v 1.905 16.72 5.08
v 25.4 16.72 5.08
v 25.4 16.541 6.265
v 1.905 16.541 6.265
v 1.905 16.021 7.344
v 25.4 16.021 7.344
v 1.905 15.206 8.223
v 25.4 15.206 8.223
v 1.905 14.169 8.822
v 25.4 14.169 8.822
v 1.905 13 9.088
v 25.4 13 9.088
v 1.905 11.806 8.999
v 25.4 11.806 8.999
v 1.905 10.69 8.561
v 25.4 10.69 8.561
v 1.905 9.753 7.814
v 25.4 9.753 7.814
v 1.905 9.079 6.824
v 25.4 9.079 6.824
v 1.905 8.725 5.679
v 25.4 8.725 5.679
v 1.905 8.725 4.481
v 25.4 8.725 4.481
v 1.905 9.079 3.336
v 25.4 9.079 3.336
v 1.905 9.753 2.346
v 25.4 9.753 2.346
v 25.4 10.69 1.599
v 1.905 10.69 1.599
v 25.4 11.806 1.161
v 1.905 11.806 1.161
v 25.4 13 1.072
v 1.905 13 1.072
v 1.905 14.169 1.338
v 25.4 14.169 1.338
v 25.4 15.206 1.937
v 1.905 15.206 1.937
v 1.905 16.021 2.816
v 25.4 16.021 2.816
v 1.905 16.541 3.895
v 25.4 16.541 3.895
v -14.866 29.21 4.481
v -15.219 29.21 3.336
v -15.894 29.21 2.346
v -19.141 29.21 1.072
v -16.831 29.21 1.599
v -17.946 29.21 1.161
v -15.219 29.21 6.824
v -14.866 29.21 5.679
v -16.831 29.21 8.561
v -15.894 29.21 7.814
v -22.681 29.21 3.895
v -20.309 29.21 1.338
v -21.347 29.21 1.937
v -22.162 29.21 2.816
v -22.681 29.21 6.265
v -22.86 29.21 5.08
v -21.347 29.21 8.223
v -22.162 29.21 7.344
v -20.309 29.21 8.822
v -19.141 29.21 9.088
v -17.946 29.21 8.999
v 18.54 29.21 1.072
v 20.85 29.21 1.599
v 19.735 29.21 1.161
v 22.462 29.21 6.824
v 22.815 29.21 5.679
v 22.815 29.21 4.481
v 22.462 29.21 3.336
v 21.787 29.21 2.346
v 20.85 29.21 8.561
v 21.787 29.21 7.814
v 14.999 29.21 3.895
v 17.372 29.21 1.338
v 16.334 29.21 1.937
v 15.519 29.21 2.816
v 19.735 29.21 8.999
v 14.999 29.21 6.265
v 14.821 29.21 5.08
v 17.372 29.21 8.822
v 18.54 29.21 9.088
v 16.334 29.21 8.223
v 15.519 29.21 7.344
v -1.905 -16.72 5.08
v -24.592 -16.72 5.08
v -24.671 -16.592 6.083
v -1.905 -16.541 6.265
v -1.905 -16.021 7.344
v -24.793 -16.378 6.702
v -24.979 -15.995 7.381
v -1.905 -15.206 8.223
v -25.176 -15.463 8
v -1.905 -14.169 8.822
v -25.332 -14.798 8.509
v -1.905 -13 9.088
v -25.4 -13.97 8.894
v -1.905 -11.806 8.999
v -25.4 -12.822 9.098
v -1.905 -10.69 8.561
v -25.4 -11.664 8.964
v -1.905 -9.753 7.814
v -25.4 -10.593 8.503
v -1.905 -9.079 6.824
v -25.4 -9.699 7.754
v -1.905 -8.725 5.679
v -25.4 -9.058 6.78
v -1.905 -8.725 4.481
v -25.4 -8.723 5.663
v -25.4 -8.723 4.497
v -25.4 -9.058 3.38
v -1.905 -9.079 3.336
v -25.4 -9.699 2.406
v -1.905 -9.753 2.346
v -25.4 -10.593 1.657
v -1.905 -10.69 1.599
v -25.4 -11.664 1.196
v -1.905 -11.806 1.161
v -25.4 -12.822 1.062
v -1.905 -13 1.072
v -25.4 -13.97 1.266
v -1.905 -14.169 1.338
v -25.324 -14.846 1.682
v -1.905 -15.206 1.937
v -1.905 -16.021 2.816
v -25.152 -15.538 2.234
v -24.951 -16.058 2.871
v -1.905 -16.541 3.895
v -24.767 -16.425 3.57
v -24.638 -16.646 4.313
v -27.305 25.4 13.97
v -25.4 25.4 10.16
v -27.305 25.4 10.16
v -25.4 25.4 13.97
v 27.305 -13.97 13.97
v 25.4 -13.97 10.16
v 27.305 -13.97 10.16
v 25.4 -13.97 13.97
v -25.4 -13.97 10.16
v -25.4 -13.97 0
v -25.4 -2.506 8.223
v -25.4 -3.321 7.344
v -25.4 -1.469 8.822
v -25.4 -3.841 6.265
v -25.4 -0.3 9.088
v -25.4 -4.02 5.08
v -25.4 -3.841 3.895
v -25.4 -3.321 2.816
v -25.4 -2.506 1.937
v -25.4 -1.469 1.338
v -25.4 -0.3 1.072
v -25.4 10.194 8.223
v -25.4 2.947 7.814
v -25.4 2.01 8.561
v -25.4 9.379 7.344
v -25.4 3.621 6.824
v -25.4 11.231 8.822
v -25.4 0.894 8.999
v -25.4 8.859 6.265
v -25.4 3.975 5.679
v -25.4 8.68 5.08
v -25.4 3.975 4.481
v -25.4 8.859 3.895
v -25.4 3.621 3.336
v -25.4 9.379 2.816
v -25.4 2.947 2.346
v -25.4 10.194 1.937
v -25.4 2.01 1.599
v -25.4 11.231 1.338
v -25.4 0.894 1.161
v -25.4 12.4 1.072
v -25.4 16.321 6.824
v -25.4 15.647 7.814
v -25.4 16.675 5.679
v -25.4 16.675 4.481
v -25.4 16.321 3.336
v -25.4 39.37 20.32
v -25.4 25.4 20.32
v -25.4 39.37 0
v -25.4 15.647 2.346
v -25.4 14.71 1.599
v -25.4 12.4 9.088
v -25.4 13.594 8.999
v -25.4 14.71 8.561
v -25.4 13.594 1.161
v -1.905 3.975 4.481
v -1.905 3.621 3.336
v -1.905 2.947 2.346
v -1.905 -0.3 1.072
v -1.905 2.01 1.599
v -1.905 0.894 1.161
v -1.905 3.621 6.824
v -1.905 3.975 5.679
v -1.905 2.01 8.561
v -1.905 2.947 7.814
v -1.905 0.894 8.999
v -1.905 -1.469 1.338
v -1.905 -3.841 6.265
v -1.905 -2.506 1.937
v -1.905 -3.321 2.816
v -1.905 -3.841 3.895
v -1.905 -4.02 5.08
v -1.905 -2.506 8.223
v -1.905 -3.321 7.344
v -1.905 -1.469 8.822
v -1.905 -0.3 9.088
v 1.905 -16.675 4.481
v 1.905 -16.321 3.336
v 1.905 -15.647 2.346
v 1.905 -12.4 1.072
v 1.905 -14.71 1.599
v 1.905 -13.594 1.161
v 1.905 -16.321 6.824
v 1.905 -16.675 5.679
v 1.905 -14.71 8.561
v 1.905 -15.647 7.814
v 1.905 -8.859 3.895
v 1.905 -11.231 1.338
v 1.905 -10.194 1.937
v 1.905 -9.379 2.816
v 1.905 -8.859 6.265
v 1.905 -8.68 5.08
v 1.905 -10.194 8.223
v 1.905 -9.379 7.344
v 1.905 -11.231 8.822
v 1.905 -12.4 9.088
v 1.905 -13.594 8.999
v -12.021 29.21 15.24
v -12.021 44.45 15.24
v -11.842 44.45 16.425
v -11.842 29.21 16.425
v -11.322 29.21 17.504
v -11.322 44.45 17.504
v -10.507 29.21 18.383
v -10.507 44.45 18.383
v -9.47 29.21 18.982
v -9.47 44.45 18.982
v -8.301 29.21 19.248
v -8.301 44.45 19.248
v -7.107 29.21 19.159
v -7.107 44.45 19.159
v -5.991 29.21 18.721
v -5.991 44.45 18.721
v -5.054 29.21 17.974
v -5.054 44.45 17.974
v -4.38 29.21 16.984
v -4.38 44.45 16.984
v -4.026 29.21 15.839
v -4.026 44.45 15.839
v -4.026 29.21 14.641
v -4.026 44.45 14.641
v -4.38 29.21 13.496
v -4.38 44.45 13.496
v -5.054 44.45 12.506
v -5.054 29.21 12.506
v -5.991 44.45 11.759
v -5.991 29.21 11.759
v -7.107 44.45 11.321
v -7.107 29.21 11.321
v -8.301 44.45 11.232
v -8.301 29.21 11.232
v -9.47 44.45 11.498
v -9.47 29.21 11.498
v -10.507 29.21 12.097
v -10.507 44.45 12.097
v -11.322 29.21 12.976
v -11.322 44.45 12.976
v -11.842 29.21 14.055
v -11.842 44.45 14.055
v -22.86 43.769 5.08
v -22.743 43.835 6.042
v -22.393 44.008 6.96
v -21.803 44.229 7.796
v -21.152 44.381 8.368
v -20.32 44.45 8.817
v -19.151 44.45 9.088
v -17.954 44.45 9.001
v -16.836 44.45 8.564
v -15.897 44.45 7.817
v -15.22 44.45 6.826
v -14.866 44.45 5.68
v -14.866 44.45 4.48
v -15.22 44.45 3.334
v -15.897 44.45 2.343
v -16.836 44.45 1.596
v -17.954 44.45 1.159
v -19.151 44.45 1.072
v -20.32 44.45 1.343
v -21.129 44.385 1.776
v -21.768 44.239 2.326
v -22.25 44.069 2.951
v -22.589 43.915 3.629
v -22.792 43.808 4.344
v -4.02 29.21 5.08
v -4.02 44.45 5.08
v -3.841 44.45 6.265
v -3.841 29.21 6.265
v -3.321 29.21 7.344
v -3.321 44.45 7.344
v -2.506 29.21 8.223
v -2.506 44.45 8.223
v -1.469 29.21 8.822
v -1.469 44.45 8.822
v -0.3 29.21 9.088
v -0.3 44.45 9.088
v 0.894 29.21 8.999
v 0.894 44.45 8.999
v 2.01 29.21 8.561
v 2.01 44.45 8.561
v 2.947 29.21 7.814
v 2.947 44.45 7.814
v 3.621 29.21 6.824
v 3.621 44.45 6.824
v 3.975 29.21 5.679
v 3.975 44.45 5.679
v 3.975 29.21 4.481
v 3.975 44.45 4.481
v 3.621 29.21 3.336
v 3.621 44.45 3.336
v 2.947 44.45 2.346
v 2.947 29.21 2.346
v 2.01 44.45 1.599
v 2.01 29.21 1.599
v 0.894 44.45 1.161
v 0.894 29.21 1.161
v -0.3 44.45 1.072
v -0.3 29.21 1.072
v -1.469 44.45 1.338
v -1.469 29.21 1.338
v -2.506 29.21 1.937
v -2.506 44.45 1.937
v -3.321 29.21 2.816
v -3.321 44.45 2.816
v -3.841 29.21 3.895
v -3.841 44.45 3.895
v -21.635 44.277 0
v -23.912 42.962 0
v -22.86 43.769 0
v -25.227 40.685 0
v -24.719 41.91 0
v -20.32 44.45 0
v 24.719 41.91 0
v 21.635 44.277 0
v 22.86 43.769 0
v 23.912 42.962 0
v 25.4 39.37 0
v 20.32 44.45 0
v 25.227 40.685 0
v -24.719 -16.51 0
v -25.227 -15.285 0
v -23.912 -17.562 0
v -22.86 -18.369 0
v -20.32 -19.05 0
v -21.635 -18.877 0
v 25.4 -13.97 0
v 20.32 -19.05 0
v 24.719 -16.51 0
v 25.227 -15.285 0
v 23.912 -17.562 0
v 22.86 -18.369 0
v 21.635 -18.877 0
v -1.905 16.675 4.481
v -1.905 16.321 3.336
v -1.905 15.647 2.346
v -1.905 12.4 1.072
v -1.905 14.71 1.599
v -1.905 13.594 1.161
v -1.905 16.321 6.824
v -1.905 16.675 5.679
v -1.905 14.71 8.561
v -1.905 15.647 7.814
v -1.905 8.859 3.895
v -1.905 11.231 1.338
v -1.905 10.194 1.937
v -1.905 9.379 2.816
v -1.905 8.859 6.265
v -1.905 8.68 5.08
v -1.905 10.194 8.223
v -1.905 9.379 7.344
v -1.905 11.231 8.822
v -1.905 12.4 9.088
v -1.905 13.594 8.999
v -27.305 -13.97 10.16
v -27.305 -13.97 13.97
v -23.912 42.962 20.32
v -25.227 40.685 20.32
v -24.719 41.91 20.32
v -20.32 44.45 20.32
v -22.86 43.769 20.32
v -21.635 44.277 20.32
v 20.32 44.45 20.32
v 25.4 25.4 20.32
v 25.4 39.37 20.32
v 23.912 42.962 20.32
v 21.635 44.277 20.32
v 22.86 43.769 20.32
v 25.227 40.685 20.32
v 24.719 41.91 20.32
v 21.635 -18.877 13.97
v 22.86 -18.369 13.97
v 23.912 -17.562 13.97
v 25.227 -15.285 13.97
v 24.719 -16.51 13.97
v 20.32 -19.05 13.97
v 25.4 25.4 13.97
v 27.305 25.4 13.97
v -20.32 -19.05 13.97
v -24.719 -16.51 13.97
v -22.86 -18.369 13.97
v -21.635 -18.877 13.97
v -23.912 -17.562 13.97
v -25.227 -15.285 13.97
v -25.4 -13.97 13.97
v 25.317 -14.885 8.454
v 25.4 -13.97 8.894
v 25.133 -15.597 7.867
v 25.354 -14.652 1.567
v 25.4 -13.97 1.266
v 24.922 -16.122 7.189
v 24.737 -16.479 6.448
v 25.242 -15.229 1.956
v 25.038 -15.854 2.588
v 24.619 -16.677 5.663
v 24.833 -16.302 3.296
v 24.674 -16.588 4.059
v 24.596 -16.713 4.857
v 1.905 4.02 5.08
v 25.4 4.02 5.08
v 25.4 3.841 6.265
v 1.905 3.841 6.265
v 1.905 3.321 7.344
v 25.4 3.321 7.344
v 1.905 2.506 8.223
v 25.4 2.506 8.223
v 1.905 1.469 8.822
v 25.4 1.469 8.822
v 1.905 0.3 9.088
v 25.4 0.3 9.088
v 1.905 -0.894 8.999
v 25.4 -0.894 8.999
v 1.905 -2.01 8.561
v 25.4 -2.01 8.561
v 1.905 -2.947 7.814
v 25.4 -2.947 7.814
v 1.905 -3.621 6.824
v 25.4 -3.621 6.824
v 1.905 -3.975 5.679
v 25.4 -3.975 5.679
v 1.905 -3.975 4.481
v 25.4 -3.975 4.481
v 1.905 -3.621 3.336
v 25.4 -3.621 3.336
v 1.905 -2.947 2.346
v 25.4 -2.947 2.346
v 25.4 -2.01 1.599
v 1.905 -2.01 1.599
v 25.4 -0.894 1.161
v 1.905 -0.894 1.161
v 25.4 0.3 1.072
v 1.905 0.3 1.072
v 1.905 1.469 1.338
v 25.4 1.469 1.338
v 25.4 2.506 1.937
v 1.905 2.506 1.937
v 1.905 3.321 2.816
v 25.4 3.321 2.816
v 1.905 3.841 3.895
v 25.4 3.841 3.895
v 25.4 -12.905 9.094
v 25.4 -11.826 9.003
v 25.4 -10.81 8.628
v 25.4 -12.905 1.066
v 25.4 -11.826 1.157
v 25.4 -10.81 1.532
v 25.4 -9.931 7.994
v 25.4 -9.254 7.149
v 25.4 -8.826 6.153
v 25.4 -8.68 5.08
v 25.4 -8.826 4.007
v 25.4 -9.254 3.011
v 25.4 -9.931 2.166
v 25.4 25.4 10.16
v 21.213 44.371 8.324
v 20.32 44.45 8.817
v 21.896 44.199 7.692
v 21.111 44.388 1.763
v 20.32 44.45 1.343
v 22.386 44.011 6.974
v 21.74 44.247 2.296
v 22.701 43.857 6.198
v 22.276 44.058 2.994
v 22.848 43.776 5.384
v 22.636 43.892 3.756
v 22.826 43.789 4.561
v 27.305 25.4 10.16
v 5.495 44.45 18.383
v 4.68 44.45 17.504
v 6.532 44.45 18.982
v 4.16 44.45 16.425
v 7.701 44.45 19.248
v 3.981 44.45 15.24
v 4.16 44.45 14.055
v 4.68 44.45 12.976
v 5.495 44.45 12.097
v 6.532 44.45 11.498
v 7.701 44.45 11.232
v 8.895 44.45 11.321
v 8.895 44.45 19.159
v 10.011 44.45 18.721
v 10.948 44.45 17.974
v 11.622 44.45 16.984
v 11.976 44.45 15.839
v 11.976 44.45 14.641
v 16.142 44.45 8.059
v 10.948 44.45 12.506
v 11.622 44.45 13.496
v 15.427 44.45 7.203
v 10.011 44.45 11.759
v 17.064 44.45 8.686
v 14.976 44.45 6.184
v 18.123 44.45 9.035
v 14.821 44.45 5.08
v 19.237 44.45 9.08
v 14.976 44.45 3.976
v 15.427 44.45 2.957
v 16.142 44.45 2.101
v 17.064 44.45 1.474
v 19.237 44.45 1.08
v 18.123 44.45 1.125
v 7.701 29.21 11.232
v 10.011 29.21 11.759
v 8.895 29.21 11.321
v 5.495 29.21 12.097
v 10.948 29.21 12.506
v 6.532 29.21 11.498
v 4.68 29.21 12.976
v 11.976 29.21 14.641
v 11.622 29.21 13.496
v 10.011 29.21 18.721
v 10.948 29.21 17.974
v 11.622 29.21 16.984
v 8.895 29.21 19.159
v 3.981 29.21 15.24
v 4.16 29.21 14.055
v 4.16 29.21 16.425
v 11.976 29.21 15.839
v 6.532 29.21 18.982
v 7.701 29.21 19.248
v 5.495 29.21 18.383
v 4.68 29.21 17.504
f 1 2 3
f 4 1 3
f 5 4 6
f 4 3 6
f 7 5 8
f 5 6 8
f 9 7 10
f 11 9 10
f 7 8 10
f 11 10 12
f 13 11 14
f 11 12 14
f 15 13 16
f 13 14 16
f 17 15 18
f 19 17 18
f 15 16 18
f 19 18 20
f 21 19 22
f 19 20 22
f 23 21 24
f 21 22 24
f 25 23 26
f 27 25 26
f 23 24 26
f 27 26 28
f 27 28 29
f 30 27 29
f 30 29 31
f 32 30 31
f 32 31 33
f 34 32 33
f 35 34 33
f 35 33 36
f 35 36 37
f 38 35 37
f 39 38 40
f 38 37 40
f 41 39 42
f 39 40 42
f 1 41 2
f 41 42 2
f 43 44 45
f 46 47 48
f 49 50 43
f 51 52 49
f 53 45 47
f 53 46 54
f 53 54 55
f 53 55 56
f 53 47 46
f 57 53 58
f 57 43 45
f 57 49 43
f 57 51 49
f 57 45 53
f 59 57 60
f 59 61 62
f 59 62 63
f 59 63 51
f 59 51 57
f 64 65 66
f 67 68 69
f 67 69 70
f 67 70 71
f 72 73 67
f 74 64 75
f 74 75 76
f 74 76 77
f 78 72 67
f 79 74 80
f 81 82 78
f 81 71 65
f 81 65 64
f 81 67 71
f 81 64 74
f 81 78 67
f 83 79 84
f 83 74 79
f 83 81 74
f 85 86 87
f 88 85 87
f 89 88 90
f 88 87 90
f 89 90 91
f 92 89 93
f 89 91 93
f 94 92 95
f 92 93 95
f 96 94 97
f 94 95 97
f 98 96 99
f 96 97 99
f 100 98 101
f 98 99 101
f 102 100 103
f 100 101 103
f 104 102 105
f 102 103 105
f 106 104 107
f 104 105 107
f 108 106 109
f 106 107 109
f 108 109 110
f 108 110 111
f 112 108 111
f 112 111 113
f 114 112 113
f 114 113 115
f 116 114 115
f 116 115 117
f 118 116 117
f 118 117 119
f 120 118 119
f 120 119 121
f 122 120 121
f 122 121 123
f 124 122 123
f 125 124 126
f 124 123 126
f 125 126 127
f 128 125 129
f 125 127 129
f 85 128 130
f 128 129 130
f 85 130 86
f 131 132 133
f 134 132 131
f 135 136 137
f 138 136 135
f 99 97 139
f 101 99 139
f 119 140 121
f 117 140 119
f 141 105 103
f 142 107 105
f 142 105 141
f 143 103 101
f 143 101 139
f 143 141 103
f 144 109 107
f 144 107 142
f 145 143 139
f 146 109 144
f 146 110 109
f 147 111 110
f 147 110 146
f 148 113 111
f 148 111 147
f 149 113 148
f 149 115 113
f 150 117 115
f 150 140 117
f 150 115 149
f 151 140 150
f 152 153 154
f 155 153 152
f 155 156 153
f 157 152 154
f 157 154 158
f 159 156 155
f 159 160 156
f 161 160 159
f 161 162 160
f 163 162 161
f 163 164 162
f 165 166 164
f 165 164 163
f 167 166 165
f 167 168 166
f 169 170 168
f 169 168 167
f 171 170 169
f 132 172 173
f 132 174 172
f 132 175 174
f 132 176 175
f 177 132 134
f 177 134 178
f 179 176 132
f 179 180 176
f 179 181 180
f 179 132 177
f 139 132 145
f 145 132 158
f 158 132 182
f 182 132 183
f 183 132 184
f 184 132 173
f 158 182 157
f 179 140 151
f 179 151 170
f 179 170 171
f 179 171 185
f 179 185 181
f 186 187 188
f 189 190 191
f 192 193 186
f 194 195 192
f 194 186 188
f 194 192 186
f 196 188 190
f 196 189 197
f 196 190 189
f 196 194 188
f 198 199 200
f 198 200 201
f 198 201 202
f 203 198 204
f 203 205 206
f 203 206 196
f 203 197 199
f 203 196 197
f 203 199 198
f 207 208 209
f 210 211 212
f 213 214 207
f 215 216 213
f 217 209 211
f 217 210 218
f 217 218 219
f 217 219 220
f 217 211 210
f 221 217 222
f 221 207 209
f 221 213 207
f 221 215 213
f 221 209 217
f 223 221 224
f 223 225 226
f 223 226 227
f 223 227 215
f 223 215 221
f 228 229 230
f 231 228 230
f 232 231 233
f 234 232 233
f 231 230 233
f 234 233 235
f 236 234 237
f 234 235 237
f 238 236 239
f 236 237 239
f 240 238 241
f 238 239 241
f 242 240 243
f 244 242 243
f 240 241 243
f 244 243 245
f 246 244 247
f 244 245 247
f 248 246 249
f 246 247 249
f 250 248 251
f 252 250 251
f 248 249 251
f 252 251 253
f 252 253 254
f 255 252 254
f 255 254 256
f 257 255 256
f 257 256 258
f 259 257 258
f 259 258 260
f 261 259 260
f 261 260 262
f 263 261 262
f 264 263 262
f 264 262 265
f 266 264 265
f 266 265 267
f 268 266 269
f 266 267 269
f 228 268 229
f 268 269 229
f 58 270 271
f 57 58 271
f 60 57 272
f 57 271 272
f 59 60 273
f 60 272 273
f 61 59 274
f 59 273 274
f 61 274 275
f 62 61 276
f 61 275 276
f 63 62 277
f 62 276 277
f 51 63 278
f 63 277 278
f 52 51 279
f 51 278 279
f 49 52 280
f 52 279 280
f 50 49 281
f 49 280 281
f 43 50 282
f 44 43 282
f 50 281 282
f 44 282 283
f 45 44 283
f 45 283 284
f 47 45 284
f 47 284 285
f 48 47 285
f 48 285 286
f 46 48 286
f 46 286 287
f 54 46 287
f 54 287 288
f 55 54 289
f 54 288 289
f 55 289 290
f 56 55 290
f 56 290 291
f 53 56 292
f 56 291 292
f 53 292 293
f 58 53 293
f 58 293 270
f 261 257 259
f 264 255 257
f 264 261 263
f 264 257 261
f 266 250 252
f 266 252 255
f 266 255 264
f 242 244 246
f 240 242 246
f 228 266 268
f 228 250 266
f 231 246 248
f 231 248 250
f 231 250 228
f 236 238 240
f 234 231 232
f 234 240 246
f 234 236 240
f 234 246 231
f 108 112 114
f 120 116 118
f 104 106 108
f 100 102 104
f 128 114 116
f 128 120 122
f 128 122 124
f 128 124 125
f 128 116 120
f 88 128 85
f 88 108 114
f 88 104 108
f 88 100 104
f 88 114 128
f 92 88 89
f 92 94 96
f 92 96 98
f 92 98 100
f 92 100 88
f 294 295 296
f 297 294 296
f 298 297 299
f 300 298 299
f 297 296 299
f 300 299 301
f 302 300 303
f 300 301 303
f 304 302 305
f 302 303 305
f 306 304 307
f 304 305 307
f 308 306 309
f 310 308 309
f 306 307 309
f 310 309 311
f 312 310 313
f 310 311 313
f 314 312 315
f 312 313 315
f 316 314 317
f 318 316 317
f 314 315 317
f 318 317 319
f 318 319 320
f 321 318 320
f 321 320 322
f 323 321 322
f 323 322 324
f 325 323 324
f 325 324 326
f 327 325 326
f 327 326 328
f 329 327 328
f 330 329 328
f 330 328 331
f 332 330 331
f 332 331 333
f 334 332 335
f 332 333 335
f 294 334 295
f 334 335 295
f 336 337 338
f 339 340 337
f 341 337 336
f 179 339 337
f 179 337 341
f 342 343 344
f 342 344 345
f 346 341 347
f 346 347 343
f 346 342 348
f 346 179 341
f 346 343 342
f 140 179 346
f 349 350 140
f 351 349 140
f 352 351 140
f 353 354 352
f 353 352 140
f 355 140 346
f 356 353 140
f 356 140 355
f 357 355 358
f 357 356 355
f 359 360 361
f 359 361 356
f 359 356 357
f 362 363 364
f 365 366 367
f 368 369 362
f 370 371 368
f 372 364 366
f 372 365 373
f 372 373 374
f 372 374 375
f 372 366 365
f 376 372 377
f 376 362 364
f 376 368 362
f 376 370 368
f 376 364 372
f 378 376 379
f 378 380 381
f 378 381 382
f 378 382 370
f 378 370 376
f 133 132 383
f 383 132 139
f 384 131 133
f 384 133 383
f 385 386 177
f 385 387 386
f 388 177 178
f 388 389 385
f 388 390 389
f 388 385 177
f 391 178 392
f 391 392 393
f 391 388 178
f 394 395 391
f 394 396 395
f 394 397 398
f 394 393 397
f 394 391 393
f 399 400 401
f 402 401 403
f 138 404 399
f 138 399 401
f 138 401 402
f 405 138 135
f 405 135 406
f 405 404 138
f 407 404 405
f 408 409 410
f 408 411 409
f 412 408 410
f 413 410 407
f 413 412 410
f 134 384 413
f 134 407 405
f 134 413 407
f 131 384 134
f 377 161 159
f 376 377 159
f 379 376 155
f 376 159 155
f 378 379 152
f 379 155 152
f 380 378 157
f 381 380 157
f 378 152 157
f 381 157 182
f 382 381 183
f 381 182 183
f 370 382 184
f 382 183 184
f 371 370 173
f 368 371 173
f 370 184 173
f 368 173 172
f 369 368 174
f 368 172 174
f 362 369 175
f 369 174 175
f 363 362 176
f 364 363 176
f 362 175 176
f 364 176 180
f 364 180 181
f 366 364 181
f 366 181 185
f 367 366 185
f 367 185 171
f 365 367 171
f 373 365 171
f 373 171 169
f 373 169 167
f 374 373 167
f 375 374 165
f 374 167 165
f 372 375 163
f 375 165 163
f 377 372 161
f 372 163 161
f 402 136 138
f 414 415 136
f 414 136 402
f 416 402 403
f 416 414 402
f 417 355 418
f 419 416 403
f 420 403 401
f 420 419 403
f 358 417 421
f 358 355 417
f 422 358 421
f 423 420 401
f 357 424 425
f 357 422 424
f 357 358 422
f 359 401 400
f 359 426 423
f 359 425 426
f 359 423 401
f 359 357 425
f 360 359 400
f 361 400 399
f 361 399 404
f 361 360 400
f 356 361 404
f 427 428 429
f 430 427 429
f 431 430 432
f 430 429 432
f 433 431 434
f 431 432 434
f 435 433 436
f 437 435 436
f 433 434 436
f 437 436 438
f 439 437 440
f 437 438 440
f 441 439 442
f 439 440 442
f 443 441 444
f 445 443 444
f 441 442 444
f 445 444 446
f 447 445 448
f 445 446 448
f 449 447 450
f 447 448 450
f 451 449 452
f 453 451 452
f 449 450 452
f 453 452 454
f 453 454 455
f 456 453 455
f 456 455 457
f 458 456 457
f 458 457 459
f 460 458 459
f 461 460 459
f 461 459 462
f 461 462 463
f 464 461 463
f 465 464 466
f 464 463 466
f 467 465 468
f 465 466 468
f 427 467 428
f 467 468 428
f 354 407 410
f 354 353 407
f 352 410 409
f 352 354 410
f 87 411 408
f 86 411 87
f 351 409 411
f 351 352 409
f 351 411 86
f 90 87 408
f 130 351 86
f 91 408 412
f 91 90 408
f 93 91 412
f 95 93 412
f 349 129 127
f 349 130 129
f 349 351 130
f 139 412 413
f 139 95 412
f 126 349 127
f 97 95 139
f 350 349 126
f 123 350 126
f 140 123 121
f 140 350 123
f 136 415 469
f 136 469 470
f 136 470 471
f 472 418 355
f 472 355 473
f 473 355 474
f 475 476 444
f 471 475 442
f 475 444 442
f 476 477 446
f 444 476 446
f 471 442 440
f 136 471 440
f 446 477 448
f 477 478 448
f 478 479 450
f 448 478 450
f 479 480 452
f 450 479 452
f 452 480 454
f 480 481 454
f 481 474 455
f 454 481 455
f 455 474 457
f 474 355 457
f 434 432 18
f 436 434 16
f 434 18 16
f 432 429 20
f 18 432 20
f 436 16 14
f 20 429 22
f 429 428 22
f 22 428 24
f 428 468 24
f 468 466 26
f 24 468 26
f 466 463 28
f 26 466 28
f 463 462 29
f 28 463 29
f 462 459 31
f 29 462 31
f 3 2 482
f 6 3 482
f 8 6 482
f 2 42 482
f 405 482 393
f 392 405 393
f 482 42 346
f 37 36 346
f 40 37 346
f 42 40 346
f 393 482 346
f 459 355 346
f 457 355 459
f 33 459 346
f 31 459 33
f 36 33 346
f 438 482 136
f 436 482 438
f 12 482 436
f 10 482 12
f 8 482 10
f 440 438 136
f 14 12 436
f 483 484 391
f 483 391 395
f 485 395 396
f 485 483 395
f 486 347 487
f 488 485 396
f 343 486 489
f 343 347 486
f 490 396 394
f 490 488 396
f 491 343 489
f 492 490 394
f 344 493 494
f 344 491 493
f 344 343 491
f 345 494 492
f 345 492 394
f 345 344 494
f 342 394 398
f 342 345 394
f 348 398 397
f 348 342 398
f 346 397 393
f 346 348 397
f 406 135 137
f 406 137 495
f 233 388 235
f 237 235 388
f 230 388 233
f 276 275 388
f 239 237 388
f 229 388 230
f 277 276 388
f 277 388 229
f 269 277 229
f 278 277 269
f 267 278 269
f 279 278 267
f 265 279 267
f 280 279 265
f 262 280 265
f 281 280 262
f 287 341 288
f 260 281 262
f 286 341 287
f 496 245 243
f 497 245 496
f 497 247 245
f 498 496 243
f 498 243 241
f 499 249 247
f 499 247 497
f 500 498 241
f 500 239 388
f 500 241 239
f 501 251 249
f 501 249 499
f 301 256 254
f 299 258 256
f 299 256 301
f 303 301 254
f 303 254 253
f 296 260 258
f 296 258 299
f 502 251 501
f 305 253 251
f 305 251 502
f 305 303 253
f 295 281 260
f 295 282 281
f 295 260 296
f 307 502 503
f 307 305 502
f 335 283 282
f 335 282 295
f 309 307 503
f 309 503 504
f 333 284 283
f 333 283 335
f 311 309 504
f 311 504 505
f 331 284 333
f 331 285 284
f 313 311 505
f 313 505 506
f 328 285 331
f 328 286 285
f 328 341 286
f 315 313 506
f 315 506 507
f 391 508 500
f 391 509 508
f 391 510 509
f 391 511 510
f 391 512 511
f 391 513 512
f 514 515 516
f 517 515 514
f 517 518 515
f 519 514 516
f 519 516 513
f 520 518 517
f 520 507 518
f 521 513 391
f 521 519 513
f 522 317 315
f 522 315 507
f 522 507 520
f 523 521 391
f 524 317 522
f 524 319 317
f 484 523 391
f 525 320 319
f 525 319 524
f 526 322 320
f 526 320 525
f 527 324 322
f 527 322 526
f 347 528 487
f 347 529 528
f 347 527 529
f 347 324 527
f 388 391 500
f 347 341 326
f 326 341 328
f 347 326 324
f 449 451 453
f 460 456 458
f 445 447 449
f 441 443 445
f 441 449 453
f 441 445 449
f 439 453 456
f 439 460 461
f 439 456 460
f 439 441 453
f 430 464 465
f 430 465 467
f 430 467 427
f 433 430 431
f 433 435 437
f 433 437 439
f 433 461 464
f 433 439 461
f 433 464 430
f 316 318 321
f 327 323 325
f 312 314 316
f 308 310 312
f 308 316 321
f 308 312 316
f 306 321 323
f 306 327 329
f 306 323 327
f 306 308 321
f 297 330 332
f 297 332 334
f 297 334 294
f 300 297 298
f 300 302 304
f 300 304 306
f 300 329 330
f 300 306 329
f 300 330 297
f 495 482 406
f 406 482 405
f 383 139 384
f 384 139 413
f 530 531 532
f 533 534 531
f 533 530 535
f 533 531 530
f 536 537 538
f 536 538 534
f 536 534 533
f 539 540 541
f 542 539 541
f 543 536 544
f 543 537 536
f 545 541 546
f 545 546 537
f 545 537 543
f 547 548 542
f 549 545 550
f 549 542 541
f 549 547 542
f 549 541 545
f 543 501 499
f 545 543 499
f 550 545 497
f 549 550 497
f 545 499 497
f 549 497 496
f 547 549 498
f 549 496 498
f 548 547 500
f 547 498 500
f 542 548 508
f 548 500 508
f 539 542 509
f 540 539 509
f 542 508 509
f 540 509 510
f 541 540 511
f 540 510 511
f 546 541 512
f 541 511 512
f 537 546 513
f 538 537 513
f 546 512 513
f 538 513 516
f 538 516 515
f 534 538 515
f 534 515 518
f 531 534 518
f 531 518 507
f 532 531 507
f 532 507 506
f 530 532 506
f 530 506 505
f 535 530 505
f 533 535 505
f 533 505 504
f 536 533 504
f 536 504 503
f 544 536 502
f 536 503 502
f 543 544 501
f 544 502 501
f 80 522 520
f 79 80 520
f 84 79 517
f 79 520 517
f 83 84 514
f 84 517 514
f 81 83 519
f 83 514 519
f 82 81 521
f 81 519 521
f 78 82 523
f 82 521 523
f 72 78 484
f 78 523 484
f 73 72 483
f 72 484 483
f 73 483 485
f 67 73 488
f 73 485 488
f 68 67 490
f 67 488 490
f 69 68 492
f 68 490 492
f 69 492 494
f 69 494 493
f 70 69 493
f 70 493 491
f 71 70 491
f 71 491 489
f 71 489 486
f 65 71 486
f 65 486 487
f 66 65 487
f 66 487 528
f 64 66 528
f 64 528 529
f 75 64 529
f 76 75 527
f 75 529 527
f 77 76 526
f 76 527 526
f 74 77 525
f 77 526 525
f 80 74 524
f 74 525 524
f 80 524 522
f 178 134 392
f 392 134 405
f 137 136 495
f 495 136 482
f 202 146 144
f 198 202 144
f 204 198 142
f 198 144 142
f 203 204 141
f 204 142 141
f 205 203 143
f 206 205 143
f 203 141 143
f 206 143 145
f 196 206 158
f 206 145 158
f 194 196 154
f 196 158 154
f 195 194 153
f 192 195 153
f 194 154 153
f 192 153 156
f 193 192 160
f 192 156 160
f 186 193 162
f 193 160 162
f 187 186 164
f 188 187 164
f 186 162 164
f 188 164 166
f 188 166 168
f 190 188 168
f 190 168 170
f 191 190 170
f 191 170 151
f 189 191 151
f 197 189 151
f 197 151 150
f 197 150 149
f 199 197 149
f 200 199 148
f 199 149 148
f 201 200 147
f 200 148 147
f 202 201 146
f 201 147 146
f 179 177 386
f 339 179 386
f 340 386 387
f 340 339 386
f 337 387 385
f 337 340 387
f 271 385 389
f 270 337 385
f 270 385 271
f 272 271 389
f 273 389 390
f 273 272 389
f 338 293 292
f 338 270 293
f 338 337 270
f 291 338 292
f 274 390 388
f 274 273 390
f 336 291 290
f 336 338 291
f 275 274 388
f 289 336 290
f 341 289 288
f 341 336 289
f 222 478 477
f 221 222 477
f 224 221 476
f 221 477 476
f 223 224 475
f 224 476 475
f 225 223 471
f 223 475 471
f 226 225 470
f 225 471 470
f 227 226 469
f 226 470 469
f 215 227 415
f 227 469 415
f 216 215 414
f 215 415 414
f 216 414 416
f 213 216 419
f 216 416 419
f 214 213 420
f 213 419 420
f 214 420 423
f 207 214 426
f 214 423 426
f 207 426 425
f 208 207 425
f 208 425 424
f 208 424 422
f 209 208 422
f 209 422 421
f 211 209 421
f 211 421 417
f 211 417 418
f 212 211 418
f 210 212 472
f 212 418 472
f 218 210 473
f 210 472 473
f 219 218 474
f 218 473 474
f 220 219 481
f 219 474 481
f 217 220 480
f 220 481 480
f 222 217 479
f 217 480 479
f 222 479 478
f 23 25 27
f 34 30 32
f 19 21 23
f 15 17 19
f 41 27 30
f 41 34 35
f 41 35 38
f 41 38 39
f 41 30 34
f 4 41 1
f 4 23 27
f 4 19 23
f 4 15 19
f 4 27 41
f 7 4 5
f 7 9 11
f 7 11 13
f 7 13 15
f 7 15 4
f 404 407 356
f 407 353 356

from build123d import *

# Parameters (mm, degrees)
F0_W         = 50.8
F0_H         = 38.1
F1_DEPTH     = 10.16
F2_R         = 4.01955
F3_DEPTH     = 23.495
F4_R         = 4.01955
F5_DEPTH     = 23.495
F6_DEPTH     = 25.4
F7_W         = 50.8
F7_H         = 19.05
F8_DEPTH     = 10.16
F9_R         = 4.01955
F10_DEPTH    = 15.24
F11_T1_DEPTH = 35.56
F12_T1_DEPTH = 45.72
F13_DEPTH    = 3.81
F15_W        = 39.37
F15_H        = 3.81
F16_DEPTH    = 1.905
F14_W        = 39.37
F14_H        = 3.81
F17_DEPTH    = 1.905


# Not quite as in the source:
# - a fillet or chamfer that OpenCascade refuses, or shapes differently, is made with other operations: its cross-section is extruded or revolved along the edge and cut away or added


with BuildPart() as f1:
    # F0 (on Top) → F1 (new body)
    with BuildSketch(Plane.XY):
        Rectangle(F0_W, F0_H)
    extrude(amount=F1_DEPTH)

    # F2 (on face) → F3 (cut)
    with BuildSketch(Plane(origin=(-25.4, 0, 0), x_dir=(0, -1, 0), z_dir=(-1, 0, 0))):
        with Locations((-12.7, 5.08)):
            Circle(F2_R)
        with Locations((0, 5.08)):
            Circle(F2_R)
        with Locations((12.7, 5.08)):
            Circle(F2_R)
    extrude(amount=-F3_DEPTH, mode=Mode.SUBTRACT)

    # F4 (on face) → F5 (cut)
    with BuildSketch(Plane.YZ.offset(25.4)):
        with Locations((-12.7, 5.08)):
            Circle(F4_R)
        with Locations((0, 5.08)):
            Circle(F4_R)
        with Locations((12.7, 5.08)):
            Circle(F4_R)
    extrude(amount=-F5_DEPTH, mode=Mode.SUBTRACT)

    # F6 (add): a face of the model
    f6_faces = [f1.faces().sort_by_distance(p)[0] for p in [
        (0, 19.05, 5.08),
    ]]
    extrude(f6_faces, amount=F6_DEPTH)

    # F7 (on face) → F8 (join)
    with BuildSketch(Plane.XY.offset(10.16)):
        with Locations((0, 34.925)):
            Rectangle(F7_W, F7_H)
    extrude(amount=F8_DEPTH)

    # F9 (on face) → F10 (cut)
    with BuildSketch(Plane(origin=(0, 44.45, 0), x_dir=(-1, 0, 0), z_dir=(0, 1, 0))):
        with Locations((0, 5.08)):
            Circle(F9_R)
        with Locations((-8.001, 15.24)):
            Circle(F9_R)
        with Locations((-18.84045, 5.08)):
            Circle(F9_R)
        with Locations((8.001, 15.24)):
            Circle(F9_R)
        with Locations((18.84045, 5.08)):
            Circle(F9_R)
    extrude(amount=-F10_DEPTH, mode=Mode.SUBTRACT)

    # F11: fillet of radius 5.08 on 2 edges, made by hand

    # F11_s2 → F11_t1 (cut)
    with BuildSketch(Plane.XY.offset(-12.7)):
        with BuildLine():
            ThreePointArc((-20.32, -19.05), (-23.9121024484, -17.5621024484), (-25.4, -13.97))
            Line((-25.4, -13.97), (-25.4, -19.05))
            Line((-25.4, -19.05), (-20.32, -19.05))
        make_face()
        with BuildLine():
            ThreePointArc((20.32, -19.05), (23.9121024484, -17.5621024484), (25.4, -13.97))
            Line((25.4, -13.97), (25.4, -19.05))
            Line((25.4, -19.05), (20.32, -19.05))
        make_face()
    extrude(amount=F11_T1_DEPTH, mode=Mode.SUBTRACT)

    # F12: fillet of radius 5.08 on 2 edges, made by hand

    # F12_s2 → F12_t1 (cut)
    with BuildSketch(Plane.XY.offset(-12.7)):
        with BuildLine():
            ThreePointArc((-25.4, 39.37), (-23.9121024484, 42.9621024484), (-20.32, 44.45))
            Line((-20.32, 44.45), (-25.4, 44.45))
            Line((-25.4, 44.45), (-25.4, 39.37))
        make_face()
        with BuildLine():
            ThreePointArc((20.32, 44.45), (23.9121024484, 42.9621024484), (25.4, 39.37))
            Line((25.4, 39.37), (25.4, 44.45))
            Line((25.4, 44.45), (20.32, 44.45))
        make_face()
    extrude(amount=F12_T1_DEPTH, mode=Mode.SUBTRACT)

    # F13 (add): a face of the model
    f13_faces = [f1.faces().sort_by_distance(p)[0] for p in [
        (0, 3.2789617265, 10.16),
    ]]
    extrude(f13_faces, amount=F13_DEPTH)

    # F15 (on face) → F16 (join)
    with BuildSketch(Plane(origin=(-25.4, 0, 0), x_dir=(0, -1, 0), z_dir=(-1, 0, 0))):
        with Locations((-5.715, 12.065)):
            Rectangle(F15_W, F15_H)
    extrude(amount=F16_DEPTH)

    # F14 (on face) → F17 (join)
    with BuildSketch(Plane.YZ.offset(25.4)):
        with Locations((5.715, 12.065)):
            Rectangle(F14_W, F14_H)
    extrude(amount=F17_DEPTH)


solid = f1.part
